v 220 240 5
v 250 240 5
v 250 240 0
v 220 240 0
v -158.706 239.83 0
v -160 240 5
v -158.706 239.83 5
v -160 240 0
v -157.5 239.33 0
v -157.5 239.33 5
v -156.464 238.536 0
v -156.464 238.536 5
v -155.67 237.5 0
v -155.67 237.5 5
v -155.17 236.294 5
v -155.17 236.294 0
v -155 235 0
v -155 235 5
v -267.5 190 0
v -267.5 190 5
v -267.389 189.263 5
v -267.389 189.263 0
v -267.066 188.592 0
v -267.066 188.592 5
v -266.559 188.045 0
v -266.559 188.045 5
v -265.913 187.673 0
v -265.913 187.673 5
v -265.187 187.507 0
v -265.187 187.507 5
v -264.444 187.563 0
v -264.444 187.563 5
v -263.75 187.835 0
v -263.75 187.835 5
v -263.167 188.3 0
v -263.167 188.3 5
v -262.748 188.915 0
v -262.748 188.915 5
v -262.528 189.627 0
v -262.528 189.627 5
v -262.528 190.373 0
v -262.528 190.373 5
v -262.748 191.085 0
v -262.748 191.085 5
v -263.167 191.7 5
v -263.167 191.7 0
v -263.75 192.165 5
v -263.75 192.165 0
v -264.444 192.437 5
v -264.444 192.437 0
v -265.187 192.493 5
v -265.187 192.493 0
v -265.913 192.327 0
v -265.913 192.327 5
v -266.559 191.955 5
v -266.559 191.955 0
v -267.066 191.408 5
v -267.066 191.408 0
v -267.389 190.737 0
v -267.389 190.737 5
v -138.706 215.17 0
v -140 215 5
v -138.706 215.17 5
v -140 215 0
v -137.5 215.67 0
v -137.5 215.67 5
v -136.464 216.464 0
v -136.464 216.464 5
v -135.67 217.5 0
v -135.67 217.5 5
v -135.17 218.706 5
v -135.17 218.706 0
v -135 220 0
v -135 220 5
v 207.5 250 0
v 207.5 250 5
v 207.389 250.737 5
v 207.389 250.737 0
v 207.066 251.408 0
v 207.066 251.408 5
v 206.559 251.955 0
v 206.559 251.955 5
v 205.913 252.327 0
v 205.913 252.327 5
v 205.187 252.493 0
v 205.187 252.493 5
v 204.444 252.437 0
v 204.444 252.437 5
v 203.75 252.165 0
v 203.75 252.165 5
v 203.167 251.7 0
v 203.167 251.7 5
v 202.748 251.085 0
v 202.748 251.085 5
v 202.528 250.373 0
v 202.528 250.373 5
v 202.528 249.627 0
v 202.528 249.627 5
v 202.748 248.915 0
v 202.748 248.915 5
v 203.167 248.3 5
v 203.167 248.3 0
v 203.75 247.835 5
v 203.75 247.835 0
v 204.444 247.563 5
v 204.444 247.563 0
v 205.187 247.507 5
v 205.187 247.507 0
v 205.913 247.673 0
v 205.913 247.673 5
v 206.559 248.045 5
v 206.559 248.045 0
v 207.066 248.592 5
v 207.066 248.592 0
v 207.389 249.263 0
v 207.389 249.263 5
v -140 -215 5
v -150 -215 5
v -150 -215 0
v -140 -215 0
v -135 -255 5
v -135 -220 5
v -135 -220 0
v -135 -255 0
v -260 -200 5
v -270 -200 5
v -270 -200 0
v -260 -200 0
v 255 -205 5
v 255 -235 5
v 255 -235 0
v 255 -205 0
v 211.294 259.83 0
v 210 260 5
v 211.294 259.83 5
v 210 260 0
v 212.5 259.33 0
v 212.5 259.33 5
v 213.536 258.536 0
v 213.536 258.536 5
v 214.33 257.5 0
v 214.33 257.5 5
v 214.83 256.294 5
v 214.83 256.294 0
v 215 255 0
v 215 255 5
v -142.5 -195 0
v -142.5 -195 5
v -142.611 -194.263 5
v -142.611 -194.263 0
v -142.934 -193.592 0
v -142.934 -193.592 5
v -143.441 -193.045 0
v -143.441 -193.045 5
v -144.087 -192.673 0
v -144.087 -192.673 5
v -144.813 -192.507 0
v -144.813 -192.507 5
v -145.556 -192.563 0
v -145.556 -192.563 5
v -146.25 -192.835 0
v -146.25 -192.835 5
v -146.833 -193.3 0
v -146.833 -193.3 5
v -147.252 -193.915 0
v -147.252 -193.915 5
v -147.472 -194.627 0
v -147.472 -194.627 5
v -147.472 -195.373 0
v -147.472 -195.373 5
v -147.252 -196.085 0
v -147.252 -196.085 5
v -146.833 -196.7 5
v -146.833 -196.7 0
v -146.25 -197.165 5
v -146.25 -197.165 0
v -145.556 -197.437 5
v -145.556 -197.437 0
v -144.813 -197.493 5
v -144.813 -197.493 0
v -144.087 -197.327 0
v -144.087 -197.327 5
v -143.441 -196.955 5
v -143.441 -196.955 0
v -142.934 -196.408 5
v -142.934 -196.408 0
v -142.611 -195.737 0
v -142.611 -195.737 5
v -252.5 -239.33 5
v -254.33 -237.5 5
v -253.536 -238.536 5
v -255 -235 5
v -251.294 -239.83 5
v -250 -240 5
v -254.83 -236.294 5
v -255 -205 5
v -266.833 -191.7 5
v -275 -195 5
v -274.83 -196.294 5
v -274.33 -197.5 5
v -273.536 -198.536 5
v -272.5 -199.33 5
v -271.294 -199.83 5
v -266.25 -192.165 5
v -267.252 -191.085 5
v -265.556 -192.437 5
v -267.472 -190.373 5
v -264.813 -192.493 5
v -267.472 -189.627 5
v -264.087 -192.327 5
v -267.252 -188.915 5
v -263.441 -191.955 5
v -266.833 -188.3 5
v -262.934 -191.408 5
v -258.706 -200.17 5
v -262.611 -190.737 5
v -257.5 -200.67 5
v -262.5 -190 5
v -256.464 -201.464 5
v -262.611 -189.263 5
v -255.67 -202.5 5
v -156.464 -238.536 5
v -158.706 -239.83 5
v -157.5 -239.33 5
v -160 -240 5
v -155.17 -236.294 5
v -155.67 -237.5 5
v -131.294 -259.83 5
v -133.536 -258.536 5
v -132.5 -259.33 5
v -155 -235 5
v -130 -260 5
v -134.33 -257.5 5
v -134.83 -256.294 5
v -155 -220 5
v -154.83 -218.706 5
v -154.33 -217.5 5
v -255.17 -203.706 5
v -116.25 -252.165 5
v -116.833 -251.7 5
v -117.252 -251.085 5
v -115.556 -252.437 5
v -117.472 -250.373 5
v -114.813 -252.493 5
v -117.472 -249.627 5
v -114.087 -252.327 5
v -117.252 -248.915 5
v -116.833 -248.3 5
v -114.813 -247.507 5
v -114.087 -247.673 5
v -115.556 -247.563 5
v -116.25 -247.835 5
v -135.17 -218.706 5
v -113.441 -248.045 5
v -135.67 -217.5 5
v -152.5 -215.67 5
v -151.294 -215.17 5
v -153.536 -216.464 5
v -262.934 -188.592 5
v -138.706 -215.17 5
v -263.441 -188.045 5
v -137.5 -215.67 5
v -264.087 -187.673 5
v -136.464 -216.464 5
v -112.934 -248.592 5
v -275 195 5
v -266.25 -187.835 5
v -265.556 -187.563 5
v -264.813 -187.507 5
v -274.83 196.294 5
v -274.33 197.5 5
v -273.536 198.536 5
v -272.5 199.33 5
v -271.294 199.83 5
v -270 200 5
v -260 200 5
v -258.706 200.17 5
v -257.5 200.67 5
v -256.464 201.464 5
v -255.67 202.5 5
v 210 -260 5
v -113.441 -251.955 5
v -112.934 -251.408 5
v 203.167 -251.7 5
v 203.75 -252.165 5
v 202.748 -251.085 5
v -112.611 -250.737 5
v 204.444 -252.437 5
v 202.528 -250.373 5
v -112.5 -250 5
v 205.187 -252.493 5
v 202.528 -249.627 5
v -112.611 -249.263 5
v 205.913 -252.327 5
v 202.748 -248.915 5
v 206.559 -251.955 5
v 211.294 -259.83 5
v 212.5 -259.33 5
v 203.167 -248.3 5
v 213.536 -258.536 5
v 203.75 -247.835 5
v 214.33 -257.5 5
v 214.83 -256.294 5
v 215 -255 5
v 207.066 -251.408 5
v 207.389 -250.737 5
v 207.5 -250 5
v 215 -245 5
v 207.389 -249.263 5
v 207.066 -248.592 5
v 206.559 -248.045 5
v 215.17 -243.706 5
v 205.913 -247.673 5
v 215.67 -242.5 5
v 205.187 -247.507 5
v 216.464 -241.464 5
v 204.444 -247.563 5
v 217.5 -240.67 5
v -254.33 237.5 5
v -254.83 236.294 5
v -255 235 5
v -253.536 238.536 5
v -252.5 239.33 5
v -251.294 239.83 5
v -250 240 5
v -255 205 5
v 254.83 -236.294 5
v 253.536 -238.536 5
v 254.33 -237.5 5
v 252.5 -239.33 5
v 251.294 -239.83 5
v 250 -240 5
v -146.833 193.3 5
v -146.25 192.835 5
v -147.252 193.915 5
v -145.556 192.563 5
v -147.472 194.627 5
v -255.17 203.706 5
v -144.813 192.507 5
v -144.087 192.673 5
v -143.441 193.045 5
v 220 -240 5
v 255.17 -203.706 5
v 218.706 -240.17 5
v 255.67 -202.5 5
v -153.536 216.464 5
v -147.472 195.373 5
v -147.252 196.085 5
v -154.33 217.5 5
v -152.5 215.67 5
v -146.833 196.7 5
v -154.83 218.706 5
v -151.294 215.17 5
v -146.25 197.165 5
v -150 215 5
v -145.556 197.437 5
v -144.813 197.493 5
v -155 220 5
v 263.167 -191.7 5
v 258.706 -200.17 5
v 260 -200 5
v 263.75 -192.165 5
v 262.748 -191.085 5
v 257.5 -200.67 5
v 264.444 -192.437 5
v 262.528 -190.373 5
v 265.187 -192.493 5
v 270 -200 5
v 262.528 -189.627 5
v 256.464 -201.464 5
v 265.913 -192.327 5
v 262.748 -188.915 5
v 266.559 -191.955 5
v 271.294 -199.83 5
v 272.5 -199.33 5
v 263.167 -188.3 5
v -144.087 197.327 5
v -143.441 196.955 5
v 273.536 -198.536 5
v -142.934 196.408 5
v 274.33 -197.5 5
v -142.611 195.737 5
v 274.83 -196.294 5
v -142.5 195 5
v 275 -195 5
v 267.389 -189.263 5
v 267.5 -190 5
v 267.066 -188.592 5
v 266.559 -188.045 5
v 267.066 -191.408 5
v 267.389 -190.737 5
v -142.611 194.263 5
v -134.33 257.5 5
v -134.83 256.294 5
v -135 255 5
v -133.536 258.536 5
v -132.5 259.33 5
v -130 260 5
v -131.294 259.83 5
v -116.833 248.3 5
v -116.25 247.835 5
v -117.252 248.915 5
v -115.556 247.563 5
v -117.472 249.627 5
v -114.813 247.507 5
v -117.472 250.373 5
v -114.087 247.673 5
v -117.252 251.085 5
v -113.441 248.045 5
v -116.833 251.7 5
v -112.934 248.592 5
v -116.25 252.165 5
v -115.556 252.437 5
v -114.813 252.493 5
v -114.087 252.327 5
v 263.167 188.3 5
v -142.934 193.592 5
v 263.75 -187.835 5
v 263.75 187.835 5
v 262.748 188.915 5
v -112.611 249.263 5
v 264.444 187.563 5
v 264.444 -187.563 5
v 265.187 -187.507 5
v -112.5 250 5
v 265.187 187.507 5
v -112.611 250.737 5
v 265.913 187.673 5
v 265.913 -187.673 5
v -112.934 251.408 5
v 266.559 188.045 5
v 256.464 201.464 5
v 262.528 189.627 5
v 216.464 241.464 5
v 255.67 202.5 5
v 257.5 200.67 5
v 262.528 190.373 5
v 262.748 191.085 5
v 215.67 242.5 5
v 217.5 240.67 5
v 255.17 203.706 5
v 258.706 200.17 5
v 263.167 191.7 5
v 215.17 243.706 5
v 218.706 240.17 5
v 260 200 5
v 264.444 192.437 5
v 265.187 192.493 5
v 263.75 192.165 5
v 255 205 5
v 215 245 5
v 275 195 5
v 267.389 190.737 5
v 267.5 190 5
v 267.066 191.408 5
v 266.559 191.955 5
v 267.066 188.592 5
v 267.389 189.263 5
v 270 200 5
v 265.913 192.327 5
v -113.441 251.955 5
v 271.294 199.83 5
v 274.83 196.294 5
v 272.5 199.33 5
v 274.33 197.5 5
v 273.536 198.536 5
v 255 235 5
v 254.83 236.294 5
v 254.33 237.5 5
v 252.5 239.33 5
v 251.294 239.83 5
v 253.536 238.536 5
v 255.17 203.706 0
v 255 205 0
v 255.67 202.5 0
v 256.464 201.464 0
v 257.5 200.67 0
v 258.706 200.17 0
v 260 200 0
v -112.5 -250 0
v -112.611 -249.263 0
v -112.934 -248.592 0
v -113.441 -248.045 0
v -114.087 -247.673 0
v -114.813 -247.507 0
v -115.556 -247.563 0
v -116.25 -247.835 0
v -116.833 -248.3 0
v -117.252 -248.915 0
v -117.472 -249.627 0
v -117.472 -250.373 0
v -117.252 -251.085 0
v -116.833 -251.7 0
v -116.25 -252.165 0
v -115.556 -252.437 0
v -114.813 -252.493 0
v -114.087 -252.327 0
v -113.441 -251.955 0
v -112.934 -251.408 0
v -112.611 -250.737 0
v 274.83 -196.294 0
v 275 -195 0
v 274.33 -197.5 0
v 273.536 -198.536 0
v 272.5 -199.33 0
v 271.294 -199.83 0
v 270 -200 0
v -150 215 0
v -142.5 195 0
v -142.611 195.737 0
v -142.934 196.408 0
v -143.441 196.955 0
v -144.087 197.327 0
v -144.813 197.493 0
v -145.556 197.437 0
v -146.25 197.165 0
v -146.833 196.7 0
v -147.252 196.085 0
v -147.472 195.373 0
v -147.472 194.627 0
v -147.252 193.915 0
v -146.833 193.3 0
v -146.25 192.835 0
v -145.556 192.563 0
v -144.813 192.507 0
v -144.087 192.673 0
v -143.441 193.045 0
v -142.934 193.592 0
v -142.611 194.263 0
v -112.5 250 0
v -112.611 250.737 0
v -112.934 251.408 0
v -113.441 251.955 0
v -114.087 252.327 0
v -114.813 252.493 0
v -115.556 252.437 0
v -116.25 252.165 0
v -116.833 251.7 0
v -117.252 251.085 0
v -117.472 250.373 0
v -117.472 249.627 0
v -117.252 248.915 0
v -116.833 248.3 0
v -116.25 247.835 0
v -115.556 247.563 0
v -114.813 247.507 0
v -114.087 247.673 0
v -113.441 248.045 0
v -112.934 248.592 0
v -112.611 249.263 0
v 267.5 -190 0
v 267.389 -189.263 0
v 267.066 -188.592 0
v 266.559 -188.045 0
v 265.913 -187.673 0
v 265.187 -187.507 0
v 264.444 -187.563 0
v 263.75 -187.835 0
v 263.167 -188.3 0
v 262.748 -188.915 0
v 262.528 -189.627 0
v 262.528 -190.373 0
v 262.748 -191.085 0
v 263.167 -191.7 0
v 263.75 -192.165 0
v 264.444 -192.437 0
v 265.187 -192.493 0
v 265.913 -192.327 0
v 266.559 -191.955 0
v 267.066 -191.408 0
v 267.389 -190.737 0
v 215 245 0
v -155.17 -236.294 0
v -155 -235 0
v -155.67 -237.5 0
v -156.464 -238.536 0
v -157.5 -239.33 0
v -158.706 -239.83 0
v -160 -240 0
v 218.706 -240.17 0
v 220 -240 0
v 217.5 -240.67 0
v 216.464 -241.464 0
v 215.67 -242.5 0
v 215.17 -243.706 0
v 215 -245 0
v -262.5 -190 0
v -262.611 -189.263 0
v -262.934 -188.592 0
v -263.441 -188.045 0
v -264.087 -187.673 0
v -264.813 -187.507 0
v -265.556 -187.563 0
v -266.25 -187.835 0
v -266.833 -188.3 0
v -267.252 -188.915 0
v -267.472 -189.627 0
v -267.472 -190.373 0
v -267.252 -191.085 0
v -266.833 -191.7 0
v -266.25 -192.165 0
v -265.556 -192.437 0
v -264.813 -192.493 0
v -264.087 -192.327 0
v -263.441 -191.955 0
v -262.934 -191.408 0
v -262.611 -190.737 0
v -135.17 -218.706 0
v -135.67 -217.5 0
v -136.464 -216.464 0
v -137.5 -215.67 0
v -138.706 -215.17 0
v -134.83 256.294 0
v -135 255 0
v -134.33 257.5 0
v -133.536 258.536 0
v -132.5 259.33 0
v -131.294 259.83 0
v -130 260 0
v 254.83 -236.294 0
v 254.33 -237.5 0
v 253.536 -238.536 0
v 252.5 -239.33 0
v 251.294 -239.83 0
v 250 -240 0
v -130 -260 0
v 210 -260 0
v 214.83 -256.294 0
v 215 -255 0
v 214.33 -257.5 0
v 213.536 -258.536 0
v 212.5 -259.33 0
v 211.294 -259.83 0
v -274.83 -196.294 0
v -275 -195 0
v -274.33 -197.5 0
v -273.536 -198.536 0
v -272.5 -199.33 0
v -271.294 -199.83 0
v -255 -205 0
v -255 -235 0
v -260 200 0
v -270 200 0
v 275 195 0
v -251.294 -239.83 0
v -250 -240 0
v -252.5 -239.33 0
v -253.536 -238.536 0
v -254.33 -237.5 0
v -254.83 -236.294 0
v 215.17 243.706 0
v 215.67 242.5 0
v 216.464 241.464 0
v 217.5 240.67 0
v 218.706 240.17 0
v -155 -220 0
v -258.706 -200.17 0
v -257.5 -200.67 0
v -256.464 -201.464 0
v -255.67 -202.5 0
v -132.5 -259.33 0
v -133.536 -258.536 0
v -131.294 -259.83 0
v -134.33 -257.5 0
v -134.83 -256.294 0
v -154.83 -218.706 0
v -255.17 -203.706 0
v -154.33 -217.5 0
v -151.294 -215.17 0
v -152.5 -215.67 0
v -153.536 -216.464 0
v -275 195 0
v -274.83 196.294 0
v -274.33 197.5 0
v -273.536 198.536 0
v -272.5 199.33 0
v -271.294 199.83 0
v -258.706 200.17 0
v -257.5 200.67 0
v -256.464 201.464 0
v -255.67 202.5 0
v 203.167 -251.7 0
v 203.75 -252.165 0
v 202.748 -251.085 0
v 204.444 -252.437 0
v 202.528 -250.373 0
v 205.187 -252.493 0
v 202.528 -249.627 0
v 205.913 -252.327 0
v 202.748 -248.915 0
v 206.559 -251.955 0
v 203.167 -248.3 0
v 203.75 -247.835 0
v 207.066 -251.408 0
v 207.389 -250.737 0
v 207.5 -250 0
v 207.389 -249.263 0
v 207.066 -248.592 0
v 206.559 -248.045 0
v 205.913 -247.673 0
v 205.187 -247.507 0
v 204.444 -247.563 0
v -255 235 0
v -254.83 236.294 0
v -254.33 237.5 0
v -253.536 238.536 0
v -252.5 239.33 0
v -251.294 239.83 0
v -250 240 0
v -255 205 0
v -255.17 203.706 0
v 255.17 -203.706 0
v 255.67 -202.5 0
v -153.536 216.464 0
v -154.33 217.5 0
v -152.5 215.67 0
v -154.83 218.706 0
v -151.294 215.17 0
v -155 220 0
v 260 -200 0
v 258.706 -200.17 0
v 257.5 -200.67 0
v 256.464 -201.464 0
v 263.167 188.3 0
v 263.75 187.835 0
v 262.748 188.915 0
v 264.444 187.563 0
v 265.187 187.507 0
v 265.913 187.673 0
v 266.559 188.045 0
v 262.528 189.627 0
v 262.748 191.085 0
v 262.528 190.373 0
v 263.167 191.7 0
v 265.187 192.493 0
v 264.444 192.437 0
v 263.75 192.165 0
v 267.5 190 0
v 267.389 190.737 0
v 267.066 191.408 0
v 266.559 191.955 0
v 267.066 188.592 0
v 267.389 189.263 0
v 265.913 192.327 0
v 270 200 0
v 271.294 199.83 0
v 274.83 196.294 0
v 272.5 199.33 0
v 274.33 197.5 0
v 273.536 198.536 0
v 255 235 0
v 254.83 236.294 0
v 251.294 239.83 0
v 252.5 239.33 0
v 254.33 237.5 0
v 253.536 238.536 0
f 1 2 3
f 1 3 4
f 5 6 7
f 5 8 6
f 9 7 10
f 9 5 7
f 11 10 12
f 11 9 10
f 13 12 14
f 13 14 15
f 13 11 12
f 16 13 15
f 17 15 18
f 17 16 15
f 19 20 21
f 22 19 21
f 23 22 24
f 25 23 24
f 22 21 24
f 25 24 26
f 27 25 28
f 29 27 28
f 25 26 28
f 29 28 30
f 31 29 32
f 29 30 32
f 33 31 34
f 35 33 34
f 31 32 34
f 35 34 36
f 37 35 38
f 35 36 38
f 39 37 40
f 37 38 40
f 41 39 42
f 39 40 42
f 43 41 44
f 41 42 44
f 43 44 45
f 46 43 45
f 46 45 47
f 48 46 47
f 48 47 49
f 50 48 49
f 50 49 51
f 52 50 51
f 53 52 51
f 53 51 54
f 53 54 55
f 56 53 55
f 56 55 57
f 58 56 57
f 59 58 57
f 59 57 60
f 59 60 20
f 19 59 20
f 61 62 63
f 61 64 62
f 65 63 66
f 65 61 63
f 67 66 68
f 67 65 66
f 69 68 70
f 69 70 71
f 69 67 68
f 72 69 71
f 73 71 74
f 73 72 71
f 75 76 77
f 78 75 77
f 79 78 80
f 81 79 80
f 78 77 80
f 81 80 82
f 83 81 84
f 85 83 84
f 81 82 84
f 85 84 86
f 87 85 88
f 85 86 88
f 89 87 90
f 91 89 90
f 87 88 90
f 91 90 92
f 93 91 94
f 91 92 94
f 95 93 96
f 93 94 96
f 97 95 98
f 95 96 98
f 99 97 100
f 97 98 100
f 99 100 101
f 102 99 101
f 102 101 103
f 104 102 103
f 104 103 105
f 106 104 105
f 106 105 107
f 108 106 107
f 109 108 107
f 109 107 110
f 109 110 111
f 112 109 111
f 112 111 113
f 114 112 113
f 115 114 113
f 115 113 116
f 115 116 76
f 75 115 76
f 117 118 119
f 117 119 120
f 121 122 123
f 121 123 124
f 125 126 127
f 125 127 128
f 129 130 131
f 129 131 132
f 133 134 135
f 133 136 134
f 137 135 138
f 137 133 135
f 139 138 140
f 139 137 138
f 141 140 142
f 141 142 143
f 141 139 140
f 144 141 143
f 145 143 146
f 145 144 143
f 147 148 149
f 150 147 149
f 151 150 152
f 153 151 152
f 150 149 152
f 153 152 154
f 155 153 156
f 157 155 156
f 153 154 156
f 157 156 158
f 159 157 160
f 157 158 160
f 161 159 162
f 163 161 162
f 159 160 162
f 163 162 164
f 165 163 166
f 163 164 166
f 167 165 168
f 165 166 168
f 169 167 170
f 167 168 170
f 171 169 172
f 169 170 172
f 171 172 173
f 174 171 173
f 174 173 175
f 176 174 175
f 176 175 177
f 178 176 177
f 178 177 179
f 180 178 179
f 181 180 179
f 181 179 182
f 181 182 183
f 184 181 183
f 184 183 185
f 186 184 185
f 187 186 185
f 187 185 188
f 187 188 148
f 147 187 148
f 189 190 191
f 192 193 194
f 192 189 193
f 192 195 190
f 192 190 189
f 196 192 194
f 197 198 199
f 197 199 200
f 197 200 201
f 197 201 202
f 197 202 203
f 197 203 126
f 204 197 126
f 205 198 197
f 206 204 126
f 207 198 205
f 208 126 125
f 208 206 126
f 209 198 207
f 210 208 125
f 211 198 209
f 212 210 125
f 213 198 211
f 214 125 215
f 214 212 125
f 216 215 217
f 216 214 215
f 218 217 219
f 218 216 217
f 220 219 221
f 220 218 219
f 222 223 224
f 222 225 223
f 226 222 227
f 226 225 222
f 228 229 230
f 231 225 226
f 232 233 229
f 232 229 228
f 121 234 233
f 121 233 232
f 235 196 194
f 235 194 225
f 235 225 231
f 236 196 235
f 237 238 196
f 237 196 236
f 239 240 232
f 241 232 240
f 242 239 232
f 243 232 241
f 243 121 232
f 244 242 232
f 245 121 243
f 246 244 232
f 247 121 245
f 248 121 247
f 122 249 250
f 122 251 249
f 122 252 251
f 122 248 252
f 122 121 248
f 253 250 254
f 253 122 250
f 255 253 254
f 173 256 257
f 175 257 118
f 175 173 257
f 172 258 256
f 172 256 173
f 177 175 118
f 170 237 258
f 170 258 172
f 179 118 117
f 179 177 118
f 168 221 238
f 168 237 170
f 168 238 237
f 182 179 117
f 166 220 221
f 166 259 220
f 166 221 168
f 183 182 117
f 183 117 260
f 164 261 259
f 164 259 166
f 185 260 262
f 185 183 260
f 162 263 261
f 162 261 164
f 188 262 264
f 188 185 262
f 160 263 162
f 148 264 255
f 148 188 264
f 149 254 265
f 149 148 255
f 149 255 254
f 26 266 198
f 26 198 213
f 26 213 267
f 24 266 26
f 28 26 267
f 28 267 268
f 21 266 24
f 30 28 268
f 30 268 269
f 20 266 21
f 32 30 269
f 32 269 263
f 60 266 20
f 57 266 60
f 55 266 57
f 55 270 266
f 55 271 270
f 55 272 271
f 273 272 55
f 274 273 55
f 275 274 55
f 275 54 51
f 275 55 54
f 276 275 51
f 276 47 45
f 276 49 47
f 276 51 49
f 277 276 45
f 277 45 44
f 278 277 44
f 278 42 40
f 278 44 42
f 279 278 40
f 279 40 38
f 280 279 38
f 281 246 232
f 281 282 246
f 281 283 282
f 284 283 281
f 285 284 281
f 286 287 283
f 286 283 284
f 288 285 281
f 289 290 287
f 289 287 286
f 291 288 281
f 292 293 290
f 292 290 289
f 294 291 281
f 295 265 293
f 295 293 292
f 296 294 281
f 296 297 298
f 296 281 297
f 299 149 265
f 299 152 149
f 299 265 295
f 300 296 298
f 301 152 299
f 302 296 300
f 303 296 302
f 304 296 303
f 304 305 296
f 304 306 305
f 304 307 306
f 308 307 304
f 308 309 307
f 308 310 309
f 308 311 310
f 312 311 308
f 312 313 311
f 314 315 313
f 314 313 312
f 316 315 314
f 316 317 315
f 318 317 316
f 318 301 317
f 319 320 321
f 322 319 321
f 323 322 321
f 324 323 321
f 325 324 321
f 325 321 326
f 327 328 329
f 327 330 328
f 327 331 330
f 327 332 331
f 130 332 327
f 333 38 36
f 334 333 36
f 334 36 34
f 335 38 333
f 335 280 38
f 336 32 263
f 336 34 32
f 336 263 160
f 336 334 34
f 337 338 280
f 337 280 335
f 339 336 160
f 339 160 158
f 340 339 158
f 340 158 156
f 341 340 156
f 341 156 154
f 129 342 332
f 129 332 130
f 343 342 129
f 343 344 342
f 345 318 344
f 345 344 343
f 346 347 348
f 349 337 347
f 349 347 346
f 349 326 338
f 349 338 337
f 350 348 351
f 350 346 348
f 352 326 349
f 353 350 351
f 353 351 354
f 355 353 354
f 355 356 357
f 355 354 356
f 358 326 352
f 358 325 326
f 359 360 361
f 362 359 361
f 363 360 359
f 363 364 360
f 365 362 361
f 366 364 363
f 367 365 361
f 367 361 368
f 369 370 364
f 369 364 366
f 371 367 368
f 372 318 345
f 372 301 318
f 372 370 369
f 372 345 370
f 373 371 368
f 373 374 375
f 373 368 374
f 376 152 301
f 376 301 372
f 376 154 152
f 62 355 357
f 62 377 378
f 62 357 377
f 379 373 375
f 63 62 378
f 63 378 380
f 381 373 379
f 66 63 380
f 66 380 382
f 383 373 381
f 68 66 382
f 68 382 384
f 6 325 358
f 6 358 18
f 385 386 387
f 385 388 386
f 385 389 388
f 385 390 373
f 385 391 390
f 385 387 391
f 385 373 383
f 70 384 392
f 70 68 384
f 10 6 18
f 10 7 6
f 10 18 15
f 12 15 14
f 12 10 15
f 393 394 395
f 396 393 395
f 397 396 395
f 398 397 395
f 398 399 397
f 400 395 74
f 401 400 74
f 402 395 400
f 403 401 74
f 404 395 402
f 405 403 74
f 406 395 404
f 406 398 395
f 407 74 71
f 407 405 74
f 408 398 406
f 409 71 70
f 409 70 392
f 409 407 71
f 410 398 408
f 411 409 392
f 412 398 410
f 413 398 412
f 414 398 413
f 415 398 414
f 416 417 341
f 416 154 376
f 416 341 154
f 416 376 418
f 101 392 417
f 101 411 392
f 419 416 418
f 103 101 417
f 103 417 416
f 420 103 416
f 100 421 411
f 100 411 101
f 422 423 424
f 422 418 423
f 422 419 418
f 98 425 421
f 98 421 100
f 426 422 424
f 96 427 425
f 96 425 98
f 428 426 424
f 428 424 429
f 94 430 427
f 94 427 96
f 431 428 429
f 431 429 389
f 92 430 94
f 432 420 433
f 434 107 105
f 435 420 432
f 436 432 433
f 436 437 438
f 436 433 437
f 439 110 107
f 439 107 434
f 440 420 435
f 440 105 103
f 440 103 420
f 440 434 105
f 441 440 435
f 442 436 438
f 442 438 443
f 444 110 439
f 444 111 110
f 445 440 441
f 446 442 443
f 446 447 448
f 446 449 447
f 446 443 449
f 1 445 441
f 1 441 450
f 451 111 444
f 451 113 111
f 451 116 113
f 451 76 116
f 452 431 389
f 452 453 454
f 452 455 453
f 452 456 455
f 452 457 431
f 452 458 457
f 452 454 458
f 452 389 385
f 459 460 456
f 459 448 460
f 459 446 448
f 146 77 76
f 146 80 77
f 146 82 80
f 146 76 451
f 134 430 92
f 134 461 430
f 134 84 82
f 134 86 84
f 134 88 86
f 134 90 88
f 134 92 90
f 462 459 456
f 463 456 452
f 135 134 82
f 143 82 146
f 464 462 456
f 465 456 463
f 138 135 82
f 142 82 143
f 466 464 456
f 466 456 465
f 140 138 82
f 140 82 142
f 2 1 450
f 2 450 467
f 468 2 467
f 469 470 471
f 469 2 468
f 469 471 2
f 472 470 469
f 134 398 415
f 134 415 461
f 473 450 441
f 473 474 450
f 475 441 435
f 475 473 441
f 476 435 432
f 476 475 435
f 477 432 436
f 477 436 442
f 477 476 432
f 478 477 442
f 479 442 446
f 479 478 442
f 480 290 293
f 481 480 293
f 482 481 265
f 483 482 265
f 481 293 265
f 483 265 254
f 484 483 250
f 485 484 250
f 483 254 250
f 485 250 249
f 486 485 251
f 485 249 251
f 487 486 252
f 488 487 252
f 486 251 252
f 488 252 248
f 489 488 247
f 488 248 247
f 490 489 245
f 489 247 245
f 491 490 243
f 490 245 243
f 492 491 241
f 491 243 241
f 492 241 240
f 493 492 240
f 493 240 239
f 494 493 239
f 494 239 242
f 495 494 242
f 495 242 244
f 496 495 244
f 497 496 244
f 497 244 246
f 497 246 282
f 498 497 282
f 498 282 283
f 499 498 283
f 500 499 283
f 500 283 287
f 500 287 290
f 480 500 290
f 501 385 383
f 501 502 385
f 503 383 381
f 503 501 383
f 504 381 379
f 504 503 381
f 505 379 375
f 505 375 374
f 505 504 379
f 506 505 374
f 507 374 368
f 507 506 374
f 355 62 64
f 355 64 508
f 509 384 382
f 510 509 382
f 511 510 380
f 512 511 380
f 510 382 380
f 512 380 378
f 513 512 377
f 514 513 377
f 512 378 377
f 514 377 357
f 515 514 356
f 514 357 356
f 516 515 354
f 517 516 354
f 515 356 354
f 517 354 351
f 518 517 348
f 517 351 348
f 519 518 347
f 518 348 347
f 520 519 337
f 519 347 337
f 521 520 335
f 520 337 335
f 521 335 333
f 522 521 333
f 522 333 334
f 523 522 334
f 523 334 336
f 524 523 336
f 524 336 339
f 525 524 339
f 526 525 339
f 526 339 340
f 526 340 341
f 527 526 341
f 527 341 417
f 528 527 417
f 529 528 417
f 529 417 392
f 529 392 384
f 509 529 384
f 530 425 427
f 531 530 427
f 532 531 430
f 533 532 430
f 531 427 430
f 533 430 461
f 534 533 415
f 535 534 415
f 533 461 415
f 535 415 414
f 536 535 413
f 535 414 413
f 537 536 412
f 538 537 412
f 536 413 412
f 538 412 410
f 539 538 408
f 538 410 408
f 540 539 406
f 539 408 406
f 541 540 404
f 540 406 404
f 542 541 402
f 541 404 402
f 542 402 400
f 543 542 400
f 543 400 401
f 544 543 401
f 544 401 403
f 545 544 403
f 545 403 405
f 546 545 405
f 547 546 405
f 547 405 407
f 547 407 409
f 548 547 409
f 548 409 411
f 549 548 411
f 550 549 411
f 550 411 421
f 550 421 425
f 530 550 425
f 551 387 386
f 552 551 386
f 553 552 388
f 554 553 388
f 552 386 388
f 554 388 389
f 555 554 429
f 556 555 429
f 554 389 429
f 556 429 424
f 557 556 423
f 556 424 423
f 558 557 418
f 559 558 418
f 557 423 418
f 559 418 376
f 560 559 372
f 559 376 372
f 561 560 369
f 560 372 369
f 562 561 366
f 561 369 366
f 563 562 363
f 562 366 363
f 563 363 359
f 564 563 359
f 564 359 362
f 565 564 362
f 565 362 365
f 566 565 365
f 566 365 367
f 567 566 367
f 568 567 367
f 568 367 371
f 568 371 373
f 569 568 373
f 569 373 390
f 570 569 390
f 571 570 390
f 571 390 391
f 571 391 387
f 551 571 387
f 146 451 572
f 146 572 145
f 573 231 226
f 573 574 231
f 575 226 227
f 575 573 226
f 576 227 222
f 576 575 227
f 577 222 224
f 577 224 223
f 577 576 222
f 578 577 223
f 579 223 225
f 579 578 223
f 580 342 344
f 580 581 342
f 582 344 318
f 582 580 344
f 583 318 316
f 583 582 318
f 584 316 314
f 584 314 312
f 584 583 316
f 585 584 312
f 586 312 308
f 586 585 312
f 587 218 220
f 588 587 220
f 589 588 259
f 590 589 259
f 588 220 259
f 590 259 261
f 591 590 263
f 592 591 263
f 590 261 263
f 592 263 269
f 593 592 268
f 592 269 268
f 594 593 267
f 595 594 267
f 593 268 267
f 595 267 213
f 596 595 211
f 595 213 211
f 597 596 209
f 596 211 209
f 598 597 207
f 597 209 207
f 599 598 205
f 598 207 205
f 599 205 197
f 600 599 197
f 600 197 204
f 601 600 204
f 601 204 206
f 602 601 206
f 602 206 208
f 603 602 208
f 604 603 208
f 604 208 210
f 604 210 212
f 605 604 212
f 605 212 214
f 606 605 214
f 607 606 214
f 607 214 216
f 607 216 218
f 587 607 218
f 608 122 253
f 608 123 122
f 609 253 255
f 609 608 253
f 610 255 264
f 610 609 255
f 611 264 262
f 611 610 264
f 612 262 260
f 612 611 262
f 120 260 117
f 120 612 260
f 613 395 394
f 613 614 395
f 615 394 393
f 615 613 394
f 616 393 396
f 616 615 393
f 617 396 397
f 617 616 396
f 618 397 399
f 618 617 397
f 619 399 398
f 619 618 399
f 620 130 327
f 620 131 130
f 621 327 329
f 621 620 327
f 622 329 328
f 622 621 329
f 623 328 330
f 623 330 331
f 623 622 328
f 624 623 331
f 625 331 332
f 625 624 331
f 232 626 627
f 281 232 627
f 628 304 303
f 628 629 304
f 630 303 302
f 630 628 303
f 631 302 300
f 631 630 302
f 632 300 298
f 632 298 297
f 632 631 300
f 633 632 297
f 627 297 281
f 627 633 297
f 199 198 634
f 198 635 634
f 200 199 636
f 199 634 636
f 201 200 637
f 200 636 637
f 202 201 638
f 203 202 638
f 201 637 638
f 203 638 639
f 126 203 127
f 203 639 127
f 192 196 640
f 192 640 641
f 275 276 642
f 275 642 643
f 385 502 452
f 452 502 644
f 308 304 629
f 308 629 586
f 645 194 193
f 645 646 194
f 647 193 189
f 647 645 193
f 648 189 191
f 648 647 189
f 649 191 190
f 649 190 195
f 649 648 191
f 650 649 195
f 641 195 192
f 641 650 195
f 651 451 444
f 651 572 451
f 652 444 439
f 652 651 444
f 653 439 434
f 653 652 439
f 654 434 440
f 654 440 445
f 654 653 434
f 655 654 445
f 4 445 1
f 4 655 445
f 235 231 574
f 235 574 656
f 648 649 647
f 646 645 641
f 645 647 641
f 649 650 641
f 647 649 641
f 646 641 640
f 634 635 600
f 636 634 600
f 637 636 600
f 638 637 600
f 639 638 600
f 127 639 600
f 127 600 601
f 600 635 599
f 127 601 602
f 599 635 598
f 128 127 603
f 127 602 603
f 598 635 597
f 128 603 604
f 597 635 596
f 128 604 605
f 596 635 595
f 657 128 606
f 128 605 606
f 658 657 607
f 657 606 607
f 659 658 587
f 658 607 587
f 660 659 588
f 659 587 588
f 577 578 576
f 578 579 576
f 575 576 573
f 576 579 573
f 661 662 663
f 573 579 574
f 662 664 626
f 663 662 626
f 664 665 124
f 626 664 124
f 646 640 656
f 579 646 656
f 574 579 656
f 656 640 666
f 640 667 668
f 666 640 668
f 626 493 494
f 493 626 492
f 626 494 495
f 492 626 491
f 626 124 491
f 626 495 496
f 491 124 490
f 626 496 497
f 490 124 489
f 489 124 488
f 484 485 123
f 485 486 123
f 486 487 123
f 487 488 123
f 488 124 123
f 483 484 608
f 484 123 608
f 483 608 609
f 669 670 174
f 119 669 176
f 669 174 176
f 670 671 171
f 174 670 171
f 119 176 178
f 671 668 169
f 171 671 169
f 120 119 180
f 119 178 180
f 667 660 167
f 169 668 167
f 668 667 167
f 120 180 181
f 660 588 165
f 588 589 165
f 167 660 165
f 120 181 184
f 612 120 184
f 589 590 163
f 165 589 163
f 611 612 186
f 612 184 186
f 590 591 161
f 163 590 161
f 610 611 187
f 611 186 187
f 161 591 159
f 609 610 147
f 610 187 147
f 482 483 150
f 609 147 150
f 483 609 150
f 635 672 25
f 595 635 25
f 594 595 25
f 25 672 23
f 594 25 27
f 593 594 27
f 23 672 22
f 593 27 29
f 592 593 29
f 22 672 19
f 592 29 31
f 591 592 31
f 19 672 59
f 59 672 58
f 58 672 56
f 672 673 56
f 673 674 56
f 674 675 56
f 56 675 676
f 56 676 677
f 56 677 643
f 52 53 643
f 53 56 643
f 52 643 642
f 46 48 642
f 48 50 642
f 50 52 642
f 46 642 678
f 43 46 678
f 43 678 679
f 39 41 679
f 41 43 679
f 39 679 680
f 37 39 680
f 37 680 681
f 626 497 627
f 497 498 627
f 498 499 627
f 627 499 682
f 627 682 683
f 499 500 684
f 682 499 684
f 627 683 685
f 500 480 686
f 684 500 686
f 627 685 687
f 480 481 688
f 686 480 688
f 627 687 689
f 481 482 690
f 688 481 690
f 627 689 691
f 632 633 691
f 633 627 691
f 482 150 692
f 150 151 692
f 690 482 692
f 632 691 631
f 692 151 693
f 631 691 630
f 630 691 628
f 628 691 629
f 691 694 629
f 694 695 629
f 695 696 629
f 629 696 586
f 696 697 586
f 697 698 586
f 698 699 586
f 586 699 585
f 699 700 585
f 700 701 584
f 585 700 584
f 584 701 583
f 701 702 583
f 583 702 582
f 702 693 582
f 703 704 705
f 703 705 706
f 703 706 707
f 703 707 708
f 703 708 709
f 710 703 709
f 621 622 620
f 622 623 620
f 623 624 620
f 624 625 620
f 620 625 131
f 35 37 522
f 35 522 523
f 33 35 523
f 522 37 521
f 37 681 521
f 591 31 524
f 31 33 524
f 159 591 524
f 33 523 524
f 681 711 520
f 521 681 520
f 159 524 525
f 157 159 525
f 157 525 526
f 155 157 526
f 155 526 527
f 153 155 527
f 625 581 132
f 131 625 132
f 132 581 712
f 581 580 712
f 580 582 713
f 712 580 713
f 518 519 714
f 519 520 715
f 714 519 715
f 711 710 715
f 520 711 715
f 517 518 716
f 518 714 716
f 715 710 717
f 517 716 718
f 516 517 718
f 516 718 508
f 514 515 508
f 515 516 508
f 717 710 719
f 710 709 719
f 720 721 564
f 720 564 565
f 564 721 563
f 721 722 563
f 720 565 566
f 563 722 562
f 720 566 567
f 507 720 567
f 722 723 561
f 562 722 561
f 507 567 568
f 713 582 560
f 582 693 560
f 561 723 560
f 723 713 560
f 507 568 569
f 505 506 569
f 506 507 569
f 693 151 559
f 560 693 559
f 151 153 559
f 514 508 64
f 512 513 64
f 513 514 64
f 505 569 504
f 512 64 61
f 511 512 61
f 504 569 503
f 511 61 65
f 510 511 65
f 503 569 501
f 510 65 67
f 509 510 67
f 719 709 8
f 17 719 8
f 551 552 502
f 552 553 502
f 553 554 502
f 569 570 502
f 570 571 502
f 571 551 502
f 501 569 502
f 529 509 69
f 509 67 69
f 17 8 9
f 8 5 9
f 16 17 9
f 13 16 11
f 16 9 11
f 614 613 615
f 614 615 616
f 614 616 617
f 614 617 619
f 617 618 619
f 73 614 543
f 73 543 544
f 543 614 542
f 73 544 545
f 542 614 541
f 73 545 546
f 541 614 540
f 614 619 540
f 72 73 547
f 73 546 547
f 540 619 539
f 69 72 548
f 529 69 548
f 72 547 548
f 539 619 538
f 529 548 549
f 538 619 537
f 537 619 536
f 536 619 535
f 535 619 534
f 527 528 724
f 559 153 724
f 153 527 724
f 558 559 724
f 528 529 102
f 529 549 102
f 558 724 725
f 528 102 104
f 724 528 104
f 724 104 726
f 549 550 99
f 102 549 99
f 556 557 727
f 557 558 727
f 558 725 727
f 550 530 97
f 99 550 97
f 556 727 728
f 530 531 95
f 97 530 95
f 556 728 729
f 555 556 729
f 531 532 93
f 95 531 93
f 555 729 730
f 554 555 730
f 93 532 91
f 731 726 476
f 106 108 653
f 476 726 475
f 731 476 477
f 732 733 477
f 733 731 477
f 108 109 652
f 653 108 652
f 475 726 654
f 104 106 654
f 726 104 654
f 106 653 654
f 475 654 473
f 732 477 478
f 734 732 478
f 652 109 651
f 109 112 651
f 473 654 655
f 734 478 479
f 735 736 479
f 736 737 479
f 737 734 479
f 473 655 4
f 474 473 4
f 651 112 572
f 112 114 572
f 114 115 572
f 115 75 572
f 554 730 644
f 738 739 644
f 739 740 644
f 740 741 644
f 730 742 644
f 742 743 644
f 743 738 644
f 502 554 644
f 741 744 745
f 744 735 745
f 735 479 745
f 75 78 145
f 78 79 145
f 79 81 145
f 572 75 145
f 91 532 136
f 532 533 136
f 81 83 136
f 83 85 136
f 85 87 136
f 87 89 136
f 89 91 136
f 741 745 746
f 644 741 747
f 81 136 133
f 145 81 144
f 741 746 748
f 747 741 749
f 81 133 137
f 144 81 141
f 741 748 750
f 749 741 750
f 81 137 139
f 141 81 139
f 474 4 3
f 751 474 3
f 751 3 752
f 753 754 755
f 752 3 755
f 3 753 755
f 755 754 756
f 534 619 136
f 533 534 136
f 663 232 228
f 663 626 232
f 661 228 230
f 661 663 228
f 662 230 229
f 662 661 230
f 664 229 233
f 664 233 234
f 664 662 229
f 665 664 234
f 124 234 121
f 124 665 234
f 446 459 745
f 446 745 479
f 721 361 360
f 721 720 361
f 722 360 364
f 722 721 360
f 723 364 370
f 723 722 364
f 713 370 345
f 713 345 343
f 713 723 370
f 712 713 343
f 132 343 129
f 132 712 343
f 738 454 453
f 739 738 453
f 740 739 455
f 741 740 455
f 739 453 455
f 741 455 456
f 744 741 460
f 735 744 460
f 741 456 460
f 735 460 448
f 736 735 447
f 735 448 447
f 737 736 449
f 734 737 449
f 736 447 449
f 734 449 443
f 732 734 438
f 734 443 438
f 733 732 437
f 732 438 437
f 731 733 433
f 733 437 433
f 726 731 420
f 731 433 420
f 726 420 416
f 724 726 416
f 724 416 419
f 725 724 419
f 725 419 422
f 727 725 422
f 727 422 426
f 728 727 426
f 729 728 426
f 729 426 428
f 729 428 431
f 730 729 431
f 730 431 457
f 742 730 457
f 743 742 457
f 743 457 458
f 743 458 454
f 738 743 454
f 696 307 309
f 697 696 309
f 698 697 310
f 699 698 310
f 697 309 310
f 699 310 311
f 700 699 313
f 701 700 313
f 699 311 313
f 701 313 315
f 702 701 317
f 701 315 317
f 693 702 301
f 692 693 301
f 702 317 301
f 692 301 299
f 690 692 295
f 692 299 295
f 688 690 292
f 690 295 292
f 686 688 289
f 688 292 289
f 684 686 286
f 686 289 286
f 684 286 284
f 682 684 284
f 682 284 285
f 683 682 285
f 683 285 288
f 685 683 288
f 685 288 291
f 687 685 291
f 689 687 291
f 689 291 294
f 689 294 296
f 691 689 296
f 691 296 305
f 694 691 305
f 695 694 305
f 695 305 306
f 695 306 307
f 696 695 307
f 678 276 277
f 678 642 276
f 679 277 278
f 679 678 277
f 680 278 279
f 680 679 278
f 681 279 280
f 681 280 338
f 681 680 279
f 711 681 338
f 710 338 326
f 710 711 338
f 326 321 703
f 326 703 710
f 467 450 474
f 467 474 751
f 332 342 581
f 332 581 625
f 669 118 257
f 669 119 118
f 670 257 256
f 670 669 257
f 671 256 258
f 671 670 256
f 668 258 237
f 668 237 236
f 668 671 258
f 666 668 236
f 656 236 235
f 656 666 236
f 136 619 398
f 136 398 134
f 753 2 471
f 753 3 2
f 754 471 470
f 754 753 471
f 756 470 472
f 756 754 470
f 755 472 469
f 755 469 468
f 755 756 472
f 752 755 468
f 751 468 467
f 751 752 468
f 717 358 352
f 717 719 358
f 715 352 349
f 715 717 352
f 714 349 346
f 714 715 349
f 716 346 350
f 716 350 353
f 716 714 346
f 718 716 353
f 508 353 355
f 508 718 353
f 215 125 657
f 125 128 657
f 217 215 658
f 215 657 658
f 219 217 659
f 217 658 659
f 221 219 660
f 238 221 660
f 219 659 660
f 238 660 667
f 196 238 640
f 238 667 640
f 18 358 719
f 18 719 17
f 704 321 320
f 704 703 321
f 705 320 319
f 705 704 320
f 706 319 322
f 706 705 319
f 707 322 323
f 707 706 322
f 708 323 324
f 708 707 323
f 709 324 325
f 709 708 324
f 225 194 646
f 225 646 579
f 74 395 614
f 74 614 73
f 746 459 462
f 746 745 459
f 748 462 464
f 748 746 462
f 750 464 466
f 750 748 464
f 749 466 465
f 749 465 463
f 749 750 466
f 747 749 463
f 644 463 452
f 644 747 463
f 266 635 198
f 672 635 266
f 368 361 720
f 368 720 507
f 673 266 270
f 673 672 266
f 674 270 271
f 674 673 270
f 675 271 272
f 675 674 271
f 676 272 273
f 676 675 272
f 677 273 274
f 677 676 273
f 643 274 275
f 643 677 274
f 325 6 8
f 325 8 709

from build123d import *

# Parameters (mm, degrees)
SKETCH_1_W          = 550
SKETCH_1_H          = 520
EXTRUDE_1_DEPTH     = 5
SKETCH_2_R          = 2.5
CUT_EXTRUDE_1_DEPTH = 379.483817356
FILLET_1_R          = 5


with BuildPart() as part:
    # 草图1 → 凸台-拉伸1 (new body)
    with BuildSketch(Plane.XY):
        Rectangle(SKETCH_1_W, SKETCH_1_H)
    extrude(amount=EXTRUDE_1_DEPTH)

    # 草图2 → 切除-拉伸1 (cut, through all)
    with BuildSketch(Plane.XY.offset(5)):
        with Locations((205, 250)):
            Circle(SKETCH_2_R)
        with Locations((265, 190)):
            Circle(SKETCH_2_R)
        with Locations((-265, -190)):
            Circle(SKETCH_2_R)
        with Locations((205, -250)):
            Circle(SKETCH_2_R)
        with Locations((265, -190)):
            Circle(SKETCH_2_R)
        with Locations(Location((-265, 190, 0), (0, 0, 180))):
            Circle(SKETCH_2_R)
        with Locations((-115, 250)):
            Circle(SKETCH_2_R)
        with Locations((-115, -250)):
            Circle(SKETCH_2_R)
        with Locations((-145, -195)):
            Circle(SKETCH_2_R)
        with Locations((-145, 195)):
            Circle(SKETCH_2_R)
        Polygon((255, 240), (215, 240), (215, 260), (275, 260), (275, 200), (255, 200), align=None)
        Polygon((-255, -240), (-155, -240), (-155, -215), (-135, -215), (-135, -260), (-275, -260), (-275, -200), (-255, -200), align=None)
        Polygon((255, -240), (255, -200), (275, -200), (275, -260), (215, -260), (215, -240), align=None)
        Polygon((-275, 260), (-135, 260), (-135, 215), (-155, 215), (-155, 240), (-255, 240), (-255, 200), (-275, 200), align=None)
    extrude(amount=-CUT_EXTRUDE_1_DEPTH, mode=Mode.SUBTRACT)

    # 圆角1
    fillet_1_edges = [part.edges().sort_by_distance(p)[0] for p in [
        (215, -260, 2.5),
        (215, -240, 2.5),
        (255, -240, 2.5),
        (255, -200, 2.5),
        (275, -200, 2.5),
        (275, 200, 2.5),
        (255, 200, 2.5),
        (255, 240, 2.5),
        (215, 240, 2.5),
        (215, 260, 2.5),
        (-275, 200, 2.5),
        (-135, 260, 2.5),
        (-135, 215, 2.5),
        (-155, 215, 2.5),
        (-155, 240, 2.5),
        (-255, 240, 2.5),
        (-255, 200, 2.5),
        (-275, -200, 2.5),
        (-255, -200, 2.5),
        (-255, -240, 2.5),
        (-155, -240, 2.5),
        (-155, -215, 2.5),
        (-135, -215, 2.5),
        (-135, -260, 2.5),
    ]]
    fillet(fillet_1_edges, radius=FILLET_1_R)


solid = part.part
